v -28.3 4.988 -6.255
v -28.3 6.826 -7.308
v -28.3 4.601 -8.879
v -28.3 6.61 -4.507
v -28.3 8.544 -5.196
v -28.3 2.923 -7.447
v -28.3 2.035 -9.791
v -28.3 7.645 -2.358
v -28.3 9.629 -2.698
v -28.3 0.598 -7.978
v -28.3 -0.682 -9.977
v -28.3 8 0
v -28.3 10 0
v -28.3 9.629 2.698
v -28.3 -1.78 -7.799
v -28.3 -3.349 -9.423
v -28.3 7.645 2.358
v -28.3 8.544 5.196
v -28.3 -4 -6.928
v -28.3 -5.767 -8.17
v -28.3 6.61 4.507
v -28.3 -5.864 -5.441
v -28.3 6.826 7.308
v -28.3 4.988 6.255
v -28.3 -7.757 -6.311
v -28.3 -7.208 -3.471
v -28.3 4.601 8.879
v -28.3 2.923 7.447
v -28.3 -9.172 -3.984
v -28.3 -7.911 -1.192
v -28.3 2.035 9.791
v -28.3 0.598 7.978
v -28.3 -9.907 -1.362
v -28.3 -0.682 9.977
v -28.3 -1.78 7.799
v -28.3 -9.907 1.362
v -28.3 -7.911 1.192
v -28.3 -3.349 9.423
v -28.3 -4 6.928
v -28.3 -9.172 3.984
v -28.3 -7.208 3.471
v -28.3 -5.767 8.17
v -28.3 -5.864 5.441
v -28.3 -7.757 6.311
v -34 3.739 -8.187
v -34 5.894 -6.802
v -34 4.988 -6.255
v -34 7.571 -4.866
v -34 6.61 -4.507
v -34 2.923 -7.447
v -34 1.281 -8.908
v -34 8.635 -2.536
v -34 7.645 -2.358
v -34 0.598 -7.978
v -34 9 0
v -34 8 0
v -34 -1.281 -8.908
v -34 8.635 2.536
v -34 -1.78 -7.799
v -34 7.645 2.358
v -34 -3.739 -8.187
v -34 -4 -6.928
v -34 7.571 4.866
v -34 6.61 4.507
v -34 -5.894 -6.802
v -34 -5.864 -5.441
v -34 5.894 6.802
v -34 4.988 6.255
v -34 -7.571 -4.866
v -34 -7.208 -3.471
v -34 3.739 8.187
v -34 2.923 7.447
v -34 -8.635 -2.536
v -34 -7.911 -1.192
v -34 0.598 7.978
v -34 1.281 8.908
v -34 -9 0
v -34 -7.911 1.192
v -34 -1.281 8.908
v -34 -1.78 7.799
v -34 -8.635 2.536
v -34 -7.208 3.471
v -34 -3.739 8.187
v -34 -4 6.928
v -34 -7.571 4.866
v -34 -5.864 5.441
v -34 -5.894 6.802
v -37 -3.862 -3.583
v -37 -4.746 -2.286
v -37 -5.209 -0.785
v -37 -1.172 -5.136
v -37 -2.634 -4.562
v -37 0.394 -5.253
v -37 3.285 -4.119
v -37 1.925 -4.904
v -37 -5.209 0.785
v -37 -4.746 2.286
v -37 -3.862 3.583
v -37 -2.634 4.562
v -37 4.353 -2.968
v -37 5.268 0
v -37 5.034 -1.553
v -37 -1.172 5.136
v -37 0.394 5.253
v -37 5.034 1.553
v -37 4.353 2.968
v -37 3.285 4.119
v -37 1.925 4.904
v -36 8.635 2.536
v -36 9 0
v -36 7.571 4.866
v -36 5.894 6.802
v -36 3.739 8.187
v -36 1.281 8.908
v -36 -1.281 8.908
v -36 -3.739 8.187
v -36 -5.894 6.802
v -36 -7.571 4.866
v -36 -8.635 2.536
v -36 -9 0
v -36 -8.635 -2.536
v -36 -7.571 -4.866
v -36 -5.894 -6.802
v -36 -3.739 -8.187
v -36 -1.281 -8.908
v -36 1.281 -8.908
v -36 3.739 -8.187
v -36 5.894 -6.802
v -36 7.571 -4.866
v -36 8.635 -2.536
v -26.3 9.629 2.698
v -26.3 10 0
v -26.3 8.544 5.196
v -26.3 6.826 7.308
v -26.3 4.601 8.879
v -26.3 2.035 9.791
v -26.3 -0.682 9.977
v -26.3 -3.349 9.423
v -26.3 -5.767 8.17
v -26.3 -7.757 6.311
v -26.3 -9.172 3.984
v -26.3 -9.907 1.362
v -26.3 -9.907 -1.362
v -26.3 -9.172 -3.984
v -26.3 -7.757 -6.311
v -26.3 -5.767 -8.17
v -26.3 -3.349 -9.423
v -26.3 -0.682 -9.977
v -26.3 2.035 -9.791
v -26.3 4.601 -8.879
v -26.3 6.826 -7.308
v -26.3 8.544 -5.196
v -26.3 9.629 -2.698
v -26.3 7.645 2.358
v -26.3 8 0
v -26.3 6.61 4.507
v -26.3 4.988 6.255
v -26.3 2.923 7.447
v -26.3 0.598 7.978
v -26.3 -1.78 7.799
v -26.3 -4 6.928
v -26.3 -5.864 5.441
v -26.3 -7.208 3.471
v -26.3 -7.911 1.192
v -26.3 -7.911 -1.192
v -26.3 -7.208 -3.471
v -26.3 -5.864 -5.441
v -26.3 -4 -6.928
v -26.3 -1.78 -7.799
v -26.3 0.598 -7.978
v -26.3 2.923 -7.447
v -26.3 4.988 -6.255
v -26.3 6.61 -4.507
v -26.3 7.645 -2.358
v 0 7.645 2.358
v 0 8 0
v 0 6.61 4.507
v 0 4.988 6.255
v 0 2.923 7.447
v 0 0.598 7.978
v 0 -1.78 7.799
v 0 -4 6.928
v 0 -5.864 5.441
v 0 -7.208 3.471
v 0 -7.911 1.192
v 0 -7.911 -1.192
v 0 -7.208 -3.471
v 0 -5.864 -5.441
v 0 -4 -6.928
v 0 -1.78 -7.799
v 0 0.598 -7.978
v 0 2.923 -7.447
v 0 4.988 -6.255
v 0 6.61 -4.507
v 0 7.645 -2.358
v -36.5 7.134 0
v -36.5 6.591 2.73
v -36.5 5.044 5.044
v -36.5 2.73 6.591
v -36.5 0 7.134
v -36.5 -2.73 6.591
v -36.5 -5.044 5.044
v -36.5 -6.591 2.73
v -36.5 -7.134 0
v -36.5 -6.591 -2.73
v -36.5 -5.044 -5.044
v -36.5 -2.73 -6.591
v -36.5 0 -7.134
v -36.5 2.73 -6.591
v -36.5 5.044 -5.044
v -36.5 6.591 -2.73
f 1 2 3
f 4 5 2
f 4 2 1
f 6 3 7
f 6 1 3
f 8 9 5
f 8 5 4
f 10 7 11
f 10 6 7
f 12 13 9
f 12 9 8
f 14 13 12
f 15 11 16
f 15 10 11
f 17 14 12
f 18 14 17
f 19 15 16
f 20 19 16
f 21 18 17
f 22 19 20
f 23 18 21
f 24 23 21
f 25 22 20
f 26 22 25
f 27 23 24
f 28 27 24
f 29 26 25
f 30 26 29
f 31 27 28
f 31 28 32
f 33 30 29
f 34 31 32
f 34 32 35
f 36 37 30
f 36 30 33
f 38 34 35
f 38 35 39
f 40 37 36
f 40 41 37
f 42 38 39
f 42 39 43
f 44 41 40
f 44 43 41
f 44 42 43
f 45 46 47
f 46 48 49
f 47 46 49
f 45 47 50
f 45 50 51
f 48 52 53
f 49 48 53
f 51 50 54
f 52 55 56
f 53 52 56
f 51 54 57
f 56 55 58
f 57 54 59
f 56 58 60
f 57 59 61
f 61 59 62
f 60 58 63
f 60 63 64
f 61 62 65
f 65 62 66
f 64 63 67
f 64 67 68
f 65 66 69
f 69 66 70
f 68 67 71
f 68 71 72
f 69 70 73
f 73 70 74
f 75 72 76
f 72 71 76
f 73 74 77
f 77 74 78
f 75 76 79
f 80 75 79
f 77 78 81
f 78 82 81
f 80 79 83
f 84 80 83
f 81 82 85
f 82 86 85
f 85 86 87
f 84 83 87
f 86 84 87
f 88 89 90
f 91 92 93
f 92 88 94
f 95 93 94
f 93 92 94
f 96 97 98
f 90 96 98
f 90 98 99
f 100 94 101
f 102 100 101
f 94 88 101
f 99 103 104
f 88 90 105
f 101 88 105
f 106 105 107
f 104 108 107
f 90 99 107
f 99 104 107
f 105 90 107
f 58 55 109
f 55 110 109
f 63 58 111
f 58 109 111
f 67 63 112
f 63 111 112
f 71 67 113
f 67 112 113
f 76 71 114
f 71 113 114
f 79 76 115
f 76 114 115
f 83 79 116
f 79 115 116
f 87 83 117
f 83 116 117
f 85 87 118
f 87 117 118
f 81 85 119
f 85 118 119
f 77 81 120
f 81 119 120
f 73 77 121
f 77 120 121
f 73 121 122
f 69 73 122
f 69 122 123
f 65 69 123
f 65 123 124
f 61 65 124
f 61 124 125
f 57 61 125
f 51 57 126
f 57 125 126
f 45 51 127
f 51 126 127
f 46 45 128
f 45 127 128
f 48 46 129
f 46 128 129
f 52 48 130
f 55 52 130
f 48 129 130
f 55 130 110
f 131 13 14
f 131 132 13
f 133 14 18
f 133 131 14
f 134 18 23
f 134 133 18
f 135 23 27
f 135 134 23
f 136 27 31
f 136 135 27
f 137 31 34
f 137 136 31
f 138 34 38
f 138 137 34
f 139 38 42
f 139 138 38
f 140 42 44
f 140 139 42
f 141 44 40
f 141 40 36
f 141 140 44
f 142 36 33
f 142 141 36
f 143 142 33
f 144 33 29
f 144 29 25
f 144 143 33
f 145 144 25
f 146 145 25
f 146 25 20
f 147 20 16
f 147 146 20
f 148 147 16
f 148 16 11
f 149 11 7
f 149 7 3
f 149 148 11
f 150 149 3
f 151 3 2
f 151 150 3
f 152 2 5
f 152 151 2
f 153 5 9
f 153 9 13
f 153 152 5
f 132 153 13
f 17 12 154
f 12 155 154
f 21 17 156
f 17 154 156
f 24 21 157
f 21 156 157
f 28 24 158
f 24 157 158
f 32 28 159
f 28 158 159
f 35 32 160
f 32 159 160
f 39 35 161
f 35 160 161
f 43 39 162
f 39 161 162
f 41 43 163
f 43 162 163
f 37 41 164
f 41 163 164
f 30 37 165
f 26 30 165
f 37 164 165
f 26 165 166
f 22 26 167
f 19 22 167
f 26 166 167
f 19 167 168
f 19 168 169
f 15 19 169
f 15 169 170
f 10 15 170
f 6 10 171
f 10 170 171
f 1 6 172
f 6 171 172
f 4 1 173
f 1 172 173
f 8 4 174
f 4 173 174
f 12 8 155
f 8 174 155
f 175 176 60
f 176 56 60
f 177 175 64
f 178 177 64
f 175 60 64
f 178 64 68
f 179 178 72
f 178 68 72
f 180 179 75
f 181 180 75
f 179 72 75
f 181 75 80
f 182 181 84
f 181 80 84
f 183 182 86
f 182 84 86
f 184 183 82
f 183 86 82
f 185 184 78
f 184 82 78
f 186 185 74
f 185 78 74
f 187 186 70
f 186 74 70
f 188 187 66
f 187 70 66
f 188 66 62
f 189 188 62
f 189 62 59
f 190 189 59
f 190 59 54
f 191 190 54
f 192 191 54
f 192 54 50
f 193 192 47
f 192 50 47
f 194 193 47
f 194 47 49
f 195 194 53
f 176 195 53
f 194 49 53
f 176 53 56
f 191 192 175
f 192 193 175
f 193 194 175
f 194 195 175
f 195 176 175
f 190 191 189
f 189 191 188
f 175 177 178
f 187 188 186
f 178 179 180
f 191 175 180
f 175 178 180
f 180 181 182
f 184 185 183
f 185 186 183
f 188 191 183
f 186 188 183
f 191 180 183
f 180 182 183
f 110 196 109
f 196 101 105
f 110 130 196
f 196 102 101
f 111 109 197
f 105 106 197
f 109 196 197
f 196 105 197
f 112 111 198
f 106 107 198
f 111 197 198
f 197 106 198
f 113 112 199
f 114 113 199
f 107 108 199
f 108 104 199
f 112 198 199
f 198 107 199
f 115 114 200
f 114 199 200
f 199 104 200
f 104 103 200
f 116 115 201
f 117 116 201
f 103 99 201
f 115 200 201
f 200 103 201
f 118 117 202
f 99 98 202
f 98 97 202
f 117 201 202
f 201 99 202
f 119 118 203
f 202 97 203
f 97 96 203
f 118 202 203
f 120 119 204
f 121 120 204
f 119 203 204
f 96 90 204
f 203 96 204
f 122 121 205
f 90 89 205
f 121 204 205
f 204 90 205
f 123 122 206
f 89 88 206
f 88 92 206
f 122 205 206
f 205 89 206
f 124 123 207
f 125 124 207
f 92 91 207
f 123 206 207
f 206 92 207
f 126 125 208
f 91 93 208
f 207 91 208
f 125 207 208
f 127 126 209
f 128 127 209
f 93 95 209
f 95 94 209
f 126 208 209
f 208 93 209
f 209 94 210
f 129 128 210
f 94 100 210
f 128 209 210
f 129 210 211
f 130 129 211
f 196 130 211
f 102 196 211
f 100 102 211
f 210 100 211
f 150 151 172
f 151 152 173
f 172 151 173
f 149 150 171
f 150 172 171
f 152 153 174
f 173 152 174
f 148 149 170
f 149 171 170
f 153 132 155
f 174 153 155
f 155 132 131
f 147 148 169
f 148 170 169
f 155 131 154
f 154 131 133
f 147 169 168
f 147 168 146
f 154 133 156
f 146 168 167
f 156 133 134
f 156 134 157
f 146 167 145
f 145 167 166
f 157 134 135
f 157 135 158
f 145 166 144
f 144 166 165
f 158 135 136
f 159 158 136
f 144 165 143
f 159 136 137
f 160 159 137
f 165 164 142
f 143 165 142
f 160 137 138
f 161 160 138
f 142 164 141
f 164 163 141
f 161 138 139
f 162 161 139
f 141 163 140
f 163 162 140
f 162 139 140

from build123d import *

# Parameters (mm, degrees)
F0_W   = 5.7
F0_H   = 8
F0_W_2 = 2
F0_W_3 = 26.3
F0_H_2 = 2


with BuildPart() as f1:
    # F0 (on Top) → F1 (revolve)
    with BuildSketch(Plane.XY):
        Polygon((-37, 5.2679491924), (-37, 0), (-34, 0), (-34, 8), (-34, 9), (-36, 9), align=None)
        with Locations((-31.15, 4)):
            Rectangle(F0_W, F0_H)
        with Locations((-27.3, 4)):
            Rectangle(F0_W_2, F0_H)
        with Locations((-13.15, 4)):
            Rectangle(F0_W_3, F0_H)
    revolve(axis=Axis((-18.5, 0, 0), (1, 0, 0)))


with BuildPart() as f2:
    # F0 (on Top) → F2 (revolve)
    with BuildSketch(Plane.XY):
        with Locations((-27.3, 9)):
            Rectangle(F0_W_2, F0_H_2)
    revolve(axis=Axis((-18.5, 0, 0), (1, 0, 0)))


solid = Compound([f1.part, f2.part])
